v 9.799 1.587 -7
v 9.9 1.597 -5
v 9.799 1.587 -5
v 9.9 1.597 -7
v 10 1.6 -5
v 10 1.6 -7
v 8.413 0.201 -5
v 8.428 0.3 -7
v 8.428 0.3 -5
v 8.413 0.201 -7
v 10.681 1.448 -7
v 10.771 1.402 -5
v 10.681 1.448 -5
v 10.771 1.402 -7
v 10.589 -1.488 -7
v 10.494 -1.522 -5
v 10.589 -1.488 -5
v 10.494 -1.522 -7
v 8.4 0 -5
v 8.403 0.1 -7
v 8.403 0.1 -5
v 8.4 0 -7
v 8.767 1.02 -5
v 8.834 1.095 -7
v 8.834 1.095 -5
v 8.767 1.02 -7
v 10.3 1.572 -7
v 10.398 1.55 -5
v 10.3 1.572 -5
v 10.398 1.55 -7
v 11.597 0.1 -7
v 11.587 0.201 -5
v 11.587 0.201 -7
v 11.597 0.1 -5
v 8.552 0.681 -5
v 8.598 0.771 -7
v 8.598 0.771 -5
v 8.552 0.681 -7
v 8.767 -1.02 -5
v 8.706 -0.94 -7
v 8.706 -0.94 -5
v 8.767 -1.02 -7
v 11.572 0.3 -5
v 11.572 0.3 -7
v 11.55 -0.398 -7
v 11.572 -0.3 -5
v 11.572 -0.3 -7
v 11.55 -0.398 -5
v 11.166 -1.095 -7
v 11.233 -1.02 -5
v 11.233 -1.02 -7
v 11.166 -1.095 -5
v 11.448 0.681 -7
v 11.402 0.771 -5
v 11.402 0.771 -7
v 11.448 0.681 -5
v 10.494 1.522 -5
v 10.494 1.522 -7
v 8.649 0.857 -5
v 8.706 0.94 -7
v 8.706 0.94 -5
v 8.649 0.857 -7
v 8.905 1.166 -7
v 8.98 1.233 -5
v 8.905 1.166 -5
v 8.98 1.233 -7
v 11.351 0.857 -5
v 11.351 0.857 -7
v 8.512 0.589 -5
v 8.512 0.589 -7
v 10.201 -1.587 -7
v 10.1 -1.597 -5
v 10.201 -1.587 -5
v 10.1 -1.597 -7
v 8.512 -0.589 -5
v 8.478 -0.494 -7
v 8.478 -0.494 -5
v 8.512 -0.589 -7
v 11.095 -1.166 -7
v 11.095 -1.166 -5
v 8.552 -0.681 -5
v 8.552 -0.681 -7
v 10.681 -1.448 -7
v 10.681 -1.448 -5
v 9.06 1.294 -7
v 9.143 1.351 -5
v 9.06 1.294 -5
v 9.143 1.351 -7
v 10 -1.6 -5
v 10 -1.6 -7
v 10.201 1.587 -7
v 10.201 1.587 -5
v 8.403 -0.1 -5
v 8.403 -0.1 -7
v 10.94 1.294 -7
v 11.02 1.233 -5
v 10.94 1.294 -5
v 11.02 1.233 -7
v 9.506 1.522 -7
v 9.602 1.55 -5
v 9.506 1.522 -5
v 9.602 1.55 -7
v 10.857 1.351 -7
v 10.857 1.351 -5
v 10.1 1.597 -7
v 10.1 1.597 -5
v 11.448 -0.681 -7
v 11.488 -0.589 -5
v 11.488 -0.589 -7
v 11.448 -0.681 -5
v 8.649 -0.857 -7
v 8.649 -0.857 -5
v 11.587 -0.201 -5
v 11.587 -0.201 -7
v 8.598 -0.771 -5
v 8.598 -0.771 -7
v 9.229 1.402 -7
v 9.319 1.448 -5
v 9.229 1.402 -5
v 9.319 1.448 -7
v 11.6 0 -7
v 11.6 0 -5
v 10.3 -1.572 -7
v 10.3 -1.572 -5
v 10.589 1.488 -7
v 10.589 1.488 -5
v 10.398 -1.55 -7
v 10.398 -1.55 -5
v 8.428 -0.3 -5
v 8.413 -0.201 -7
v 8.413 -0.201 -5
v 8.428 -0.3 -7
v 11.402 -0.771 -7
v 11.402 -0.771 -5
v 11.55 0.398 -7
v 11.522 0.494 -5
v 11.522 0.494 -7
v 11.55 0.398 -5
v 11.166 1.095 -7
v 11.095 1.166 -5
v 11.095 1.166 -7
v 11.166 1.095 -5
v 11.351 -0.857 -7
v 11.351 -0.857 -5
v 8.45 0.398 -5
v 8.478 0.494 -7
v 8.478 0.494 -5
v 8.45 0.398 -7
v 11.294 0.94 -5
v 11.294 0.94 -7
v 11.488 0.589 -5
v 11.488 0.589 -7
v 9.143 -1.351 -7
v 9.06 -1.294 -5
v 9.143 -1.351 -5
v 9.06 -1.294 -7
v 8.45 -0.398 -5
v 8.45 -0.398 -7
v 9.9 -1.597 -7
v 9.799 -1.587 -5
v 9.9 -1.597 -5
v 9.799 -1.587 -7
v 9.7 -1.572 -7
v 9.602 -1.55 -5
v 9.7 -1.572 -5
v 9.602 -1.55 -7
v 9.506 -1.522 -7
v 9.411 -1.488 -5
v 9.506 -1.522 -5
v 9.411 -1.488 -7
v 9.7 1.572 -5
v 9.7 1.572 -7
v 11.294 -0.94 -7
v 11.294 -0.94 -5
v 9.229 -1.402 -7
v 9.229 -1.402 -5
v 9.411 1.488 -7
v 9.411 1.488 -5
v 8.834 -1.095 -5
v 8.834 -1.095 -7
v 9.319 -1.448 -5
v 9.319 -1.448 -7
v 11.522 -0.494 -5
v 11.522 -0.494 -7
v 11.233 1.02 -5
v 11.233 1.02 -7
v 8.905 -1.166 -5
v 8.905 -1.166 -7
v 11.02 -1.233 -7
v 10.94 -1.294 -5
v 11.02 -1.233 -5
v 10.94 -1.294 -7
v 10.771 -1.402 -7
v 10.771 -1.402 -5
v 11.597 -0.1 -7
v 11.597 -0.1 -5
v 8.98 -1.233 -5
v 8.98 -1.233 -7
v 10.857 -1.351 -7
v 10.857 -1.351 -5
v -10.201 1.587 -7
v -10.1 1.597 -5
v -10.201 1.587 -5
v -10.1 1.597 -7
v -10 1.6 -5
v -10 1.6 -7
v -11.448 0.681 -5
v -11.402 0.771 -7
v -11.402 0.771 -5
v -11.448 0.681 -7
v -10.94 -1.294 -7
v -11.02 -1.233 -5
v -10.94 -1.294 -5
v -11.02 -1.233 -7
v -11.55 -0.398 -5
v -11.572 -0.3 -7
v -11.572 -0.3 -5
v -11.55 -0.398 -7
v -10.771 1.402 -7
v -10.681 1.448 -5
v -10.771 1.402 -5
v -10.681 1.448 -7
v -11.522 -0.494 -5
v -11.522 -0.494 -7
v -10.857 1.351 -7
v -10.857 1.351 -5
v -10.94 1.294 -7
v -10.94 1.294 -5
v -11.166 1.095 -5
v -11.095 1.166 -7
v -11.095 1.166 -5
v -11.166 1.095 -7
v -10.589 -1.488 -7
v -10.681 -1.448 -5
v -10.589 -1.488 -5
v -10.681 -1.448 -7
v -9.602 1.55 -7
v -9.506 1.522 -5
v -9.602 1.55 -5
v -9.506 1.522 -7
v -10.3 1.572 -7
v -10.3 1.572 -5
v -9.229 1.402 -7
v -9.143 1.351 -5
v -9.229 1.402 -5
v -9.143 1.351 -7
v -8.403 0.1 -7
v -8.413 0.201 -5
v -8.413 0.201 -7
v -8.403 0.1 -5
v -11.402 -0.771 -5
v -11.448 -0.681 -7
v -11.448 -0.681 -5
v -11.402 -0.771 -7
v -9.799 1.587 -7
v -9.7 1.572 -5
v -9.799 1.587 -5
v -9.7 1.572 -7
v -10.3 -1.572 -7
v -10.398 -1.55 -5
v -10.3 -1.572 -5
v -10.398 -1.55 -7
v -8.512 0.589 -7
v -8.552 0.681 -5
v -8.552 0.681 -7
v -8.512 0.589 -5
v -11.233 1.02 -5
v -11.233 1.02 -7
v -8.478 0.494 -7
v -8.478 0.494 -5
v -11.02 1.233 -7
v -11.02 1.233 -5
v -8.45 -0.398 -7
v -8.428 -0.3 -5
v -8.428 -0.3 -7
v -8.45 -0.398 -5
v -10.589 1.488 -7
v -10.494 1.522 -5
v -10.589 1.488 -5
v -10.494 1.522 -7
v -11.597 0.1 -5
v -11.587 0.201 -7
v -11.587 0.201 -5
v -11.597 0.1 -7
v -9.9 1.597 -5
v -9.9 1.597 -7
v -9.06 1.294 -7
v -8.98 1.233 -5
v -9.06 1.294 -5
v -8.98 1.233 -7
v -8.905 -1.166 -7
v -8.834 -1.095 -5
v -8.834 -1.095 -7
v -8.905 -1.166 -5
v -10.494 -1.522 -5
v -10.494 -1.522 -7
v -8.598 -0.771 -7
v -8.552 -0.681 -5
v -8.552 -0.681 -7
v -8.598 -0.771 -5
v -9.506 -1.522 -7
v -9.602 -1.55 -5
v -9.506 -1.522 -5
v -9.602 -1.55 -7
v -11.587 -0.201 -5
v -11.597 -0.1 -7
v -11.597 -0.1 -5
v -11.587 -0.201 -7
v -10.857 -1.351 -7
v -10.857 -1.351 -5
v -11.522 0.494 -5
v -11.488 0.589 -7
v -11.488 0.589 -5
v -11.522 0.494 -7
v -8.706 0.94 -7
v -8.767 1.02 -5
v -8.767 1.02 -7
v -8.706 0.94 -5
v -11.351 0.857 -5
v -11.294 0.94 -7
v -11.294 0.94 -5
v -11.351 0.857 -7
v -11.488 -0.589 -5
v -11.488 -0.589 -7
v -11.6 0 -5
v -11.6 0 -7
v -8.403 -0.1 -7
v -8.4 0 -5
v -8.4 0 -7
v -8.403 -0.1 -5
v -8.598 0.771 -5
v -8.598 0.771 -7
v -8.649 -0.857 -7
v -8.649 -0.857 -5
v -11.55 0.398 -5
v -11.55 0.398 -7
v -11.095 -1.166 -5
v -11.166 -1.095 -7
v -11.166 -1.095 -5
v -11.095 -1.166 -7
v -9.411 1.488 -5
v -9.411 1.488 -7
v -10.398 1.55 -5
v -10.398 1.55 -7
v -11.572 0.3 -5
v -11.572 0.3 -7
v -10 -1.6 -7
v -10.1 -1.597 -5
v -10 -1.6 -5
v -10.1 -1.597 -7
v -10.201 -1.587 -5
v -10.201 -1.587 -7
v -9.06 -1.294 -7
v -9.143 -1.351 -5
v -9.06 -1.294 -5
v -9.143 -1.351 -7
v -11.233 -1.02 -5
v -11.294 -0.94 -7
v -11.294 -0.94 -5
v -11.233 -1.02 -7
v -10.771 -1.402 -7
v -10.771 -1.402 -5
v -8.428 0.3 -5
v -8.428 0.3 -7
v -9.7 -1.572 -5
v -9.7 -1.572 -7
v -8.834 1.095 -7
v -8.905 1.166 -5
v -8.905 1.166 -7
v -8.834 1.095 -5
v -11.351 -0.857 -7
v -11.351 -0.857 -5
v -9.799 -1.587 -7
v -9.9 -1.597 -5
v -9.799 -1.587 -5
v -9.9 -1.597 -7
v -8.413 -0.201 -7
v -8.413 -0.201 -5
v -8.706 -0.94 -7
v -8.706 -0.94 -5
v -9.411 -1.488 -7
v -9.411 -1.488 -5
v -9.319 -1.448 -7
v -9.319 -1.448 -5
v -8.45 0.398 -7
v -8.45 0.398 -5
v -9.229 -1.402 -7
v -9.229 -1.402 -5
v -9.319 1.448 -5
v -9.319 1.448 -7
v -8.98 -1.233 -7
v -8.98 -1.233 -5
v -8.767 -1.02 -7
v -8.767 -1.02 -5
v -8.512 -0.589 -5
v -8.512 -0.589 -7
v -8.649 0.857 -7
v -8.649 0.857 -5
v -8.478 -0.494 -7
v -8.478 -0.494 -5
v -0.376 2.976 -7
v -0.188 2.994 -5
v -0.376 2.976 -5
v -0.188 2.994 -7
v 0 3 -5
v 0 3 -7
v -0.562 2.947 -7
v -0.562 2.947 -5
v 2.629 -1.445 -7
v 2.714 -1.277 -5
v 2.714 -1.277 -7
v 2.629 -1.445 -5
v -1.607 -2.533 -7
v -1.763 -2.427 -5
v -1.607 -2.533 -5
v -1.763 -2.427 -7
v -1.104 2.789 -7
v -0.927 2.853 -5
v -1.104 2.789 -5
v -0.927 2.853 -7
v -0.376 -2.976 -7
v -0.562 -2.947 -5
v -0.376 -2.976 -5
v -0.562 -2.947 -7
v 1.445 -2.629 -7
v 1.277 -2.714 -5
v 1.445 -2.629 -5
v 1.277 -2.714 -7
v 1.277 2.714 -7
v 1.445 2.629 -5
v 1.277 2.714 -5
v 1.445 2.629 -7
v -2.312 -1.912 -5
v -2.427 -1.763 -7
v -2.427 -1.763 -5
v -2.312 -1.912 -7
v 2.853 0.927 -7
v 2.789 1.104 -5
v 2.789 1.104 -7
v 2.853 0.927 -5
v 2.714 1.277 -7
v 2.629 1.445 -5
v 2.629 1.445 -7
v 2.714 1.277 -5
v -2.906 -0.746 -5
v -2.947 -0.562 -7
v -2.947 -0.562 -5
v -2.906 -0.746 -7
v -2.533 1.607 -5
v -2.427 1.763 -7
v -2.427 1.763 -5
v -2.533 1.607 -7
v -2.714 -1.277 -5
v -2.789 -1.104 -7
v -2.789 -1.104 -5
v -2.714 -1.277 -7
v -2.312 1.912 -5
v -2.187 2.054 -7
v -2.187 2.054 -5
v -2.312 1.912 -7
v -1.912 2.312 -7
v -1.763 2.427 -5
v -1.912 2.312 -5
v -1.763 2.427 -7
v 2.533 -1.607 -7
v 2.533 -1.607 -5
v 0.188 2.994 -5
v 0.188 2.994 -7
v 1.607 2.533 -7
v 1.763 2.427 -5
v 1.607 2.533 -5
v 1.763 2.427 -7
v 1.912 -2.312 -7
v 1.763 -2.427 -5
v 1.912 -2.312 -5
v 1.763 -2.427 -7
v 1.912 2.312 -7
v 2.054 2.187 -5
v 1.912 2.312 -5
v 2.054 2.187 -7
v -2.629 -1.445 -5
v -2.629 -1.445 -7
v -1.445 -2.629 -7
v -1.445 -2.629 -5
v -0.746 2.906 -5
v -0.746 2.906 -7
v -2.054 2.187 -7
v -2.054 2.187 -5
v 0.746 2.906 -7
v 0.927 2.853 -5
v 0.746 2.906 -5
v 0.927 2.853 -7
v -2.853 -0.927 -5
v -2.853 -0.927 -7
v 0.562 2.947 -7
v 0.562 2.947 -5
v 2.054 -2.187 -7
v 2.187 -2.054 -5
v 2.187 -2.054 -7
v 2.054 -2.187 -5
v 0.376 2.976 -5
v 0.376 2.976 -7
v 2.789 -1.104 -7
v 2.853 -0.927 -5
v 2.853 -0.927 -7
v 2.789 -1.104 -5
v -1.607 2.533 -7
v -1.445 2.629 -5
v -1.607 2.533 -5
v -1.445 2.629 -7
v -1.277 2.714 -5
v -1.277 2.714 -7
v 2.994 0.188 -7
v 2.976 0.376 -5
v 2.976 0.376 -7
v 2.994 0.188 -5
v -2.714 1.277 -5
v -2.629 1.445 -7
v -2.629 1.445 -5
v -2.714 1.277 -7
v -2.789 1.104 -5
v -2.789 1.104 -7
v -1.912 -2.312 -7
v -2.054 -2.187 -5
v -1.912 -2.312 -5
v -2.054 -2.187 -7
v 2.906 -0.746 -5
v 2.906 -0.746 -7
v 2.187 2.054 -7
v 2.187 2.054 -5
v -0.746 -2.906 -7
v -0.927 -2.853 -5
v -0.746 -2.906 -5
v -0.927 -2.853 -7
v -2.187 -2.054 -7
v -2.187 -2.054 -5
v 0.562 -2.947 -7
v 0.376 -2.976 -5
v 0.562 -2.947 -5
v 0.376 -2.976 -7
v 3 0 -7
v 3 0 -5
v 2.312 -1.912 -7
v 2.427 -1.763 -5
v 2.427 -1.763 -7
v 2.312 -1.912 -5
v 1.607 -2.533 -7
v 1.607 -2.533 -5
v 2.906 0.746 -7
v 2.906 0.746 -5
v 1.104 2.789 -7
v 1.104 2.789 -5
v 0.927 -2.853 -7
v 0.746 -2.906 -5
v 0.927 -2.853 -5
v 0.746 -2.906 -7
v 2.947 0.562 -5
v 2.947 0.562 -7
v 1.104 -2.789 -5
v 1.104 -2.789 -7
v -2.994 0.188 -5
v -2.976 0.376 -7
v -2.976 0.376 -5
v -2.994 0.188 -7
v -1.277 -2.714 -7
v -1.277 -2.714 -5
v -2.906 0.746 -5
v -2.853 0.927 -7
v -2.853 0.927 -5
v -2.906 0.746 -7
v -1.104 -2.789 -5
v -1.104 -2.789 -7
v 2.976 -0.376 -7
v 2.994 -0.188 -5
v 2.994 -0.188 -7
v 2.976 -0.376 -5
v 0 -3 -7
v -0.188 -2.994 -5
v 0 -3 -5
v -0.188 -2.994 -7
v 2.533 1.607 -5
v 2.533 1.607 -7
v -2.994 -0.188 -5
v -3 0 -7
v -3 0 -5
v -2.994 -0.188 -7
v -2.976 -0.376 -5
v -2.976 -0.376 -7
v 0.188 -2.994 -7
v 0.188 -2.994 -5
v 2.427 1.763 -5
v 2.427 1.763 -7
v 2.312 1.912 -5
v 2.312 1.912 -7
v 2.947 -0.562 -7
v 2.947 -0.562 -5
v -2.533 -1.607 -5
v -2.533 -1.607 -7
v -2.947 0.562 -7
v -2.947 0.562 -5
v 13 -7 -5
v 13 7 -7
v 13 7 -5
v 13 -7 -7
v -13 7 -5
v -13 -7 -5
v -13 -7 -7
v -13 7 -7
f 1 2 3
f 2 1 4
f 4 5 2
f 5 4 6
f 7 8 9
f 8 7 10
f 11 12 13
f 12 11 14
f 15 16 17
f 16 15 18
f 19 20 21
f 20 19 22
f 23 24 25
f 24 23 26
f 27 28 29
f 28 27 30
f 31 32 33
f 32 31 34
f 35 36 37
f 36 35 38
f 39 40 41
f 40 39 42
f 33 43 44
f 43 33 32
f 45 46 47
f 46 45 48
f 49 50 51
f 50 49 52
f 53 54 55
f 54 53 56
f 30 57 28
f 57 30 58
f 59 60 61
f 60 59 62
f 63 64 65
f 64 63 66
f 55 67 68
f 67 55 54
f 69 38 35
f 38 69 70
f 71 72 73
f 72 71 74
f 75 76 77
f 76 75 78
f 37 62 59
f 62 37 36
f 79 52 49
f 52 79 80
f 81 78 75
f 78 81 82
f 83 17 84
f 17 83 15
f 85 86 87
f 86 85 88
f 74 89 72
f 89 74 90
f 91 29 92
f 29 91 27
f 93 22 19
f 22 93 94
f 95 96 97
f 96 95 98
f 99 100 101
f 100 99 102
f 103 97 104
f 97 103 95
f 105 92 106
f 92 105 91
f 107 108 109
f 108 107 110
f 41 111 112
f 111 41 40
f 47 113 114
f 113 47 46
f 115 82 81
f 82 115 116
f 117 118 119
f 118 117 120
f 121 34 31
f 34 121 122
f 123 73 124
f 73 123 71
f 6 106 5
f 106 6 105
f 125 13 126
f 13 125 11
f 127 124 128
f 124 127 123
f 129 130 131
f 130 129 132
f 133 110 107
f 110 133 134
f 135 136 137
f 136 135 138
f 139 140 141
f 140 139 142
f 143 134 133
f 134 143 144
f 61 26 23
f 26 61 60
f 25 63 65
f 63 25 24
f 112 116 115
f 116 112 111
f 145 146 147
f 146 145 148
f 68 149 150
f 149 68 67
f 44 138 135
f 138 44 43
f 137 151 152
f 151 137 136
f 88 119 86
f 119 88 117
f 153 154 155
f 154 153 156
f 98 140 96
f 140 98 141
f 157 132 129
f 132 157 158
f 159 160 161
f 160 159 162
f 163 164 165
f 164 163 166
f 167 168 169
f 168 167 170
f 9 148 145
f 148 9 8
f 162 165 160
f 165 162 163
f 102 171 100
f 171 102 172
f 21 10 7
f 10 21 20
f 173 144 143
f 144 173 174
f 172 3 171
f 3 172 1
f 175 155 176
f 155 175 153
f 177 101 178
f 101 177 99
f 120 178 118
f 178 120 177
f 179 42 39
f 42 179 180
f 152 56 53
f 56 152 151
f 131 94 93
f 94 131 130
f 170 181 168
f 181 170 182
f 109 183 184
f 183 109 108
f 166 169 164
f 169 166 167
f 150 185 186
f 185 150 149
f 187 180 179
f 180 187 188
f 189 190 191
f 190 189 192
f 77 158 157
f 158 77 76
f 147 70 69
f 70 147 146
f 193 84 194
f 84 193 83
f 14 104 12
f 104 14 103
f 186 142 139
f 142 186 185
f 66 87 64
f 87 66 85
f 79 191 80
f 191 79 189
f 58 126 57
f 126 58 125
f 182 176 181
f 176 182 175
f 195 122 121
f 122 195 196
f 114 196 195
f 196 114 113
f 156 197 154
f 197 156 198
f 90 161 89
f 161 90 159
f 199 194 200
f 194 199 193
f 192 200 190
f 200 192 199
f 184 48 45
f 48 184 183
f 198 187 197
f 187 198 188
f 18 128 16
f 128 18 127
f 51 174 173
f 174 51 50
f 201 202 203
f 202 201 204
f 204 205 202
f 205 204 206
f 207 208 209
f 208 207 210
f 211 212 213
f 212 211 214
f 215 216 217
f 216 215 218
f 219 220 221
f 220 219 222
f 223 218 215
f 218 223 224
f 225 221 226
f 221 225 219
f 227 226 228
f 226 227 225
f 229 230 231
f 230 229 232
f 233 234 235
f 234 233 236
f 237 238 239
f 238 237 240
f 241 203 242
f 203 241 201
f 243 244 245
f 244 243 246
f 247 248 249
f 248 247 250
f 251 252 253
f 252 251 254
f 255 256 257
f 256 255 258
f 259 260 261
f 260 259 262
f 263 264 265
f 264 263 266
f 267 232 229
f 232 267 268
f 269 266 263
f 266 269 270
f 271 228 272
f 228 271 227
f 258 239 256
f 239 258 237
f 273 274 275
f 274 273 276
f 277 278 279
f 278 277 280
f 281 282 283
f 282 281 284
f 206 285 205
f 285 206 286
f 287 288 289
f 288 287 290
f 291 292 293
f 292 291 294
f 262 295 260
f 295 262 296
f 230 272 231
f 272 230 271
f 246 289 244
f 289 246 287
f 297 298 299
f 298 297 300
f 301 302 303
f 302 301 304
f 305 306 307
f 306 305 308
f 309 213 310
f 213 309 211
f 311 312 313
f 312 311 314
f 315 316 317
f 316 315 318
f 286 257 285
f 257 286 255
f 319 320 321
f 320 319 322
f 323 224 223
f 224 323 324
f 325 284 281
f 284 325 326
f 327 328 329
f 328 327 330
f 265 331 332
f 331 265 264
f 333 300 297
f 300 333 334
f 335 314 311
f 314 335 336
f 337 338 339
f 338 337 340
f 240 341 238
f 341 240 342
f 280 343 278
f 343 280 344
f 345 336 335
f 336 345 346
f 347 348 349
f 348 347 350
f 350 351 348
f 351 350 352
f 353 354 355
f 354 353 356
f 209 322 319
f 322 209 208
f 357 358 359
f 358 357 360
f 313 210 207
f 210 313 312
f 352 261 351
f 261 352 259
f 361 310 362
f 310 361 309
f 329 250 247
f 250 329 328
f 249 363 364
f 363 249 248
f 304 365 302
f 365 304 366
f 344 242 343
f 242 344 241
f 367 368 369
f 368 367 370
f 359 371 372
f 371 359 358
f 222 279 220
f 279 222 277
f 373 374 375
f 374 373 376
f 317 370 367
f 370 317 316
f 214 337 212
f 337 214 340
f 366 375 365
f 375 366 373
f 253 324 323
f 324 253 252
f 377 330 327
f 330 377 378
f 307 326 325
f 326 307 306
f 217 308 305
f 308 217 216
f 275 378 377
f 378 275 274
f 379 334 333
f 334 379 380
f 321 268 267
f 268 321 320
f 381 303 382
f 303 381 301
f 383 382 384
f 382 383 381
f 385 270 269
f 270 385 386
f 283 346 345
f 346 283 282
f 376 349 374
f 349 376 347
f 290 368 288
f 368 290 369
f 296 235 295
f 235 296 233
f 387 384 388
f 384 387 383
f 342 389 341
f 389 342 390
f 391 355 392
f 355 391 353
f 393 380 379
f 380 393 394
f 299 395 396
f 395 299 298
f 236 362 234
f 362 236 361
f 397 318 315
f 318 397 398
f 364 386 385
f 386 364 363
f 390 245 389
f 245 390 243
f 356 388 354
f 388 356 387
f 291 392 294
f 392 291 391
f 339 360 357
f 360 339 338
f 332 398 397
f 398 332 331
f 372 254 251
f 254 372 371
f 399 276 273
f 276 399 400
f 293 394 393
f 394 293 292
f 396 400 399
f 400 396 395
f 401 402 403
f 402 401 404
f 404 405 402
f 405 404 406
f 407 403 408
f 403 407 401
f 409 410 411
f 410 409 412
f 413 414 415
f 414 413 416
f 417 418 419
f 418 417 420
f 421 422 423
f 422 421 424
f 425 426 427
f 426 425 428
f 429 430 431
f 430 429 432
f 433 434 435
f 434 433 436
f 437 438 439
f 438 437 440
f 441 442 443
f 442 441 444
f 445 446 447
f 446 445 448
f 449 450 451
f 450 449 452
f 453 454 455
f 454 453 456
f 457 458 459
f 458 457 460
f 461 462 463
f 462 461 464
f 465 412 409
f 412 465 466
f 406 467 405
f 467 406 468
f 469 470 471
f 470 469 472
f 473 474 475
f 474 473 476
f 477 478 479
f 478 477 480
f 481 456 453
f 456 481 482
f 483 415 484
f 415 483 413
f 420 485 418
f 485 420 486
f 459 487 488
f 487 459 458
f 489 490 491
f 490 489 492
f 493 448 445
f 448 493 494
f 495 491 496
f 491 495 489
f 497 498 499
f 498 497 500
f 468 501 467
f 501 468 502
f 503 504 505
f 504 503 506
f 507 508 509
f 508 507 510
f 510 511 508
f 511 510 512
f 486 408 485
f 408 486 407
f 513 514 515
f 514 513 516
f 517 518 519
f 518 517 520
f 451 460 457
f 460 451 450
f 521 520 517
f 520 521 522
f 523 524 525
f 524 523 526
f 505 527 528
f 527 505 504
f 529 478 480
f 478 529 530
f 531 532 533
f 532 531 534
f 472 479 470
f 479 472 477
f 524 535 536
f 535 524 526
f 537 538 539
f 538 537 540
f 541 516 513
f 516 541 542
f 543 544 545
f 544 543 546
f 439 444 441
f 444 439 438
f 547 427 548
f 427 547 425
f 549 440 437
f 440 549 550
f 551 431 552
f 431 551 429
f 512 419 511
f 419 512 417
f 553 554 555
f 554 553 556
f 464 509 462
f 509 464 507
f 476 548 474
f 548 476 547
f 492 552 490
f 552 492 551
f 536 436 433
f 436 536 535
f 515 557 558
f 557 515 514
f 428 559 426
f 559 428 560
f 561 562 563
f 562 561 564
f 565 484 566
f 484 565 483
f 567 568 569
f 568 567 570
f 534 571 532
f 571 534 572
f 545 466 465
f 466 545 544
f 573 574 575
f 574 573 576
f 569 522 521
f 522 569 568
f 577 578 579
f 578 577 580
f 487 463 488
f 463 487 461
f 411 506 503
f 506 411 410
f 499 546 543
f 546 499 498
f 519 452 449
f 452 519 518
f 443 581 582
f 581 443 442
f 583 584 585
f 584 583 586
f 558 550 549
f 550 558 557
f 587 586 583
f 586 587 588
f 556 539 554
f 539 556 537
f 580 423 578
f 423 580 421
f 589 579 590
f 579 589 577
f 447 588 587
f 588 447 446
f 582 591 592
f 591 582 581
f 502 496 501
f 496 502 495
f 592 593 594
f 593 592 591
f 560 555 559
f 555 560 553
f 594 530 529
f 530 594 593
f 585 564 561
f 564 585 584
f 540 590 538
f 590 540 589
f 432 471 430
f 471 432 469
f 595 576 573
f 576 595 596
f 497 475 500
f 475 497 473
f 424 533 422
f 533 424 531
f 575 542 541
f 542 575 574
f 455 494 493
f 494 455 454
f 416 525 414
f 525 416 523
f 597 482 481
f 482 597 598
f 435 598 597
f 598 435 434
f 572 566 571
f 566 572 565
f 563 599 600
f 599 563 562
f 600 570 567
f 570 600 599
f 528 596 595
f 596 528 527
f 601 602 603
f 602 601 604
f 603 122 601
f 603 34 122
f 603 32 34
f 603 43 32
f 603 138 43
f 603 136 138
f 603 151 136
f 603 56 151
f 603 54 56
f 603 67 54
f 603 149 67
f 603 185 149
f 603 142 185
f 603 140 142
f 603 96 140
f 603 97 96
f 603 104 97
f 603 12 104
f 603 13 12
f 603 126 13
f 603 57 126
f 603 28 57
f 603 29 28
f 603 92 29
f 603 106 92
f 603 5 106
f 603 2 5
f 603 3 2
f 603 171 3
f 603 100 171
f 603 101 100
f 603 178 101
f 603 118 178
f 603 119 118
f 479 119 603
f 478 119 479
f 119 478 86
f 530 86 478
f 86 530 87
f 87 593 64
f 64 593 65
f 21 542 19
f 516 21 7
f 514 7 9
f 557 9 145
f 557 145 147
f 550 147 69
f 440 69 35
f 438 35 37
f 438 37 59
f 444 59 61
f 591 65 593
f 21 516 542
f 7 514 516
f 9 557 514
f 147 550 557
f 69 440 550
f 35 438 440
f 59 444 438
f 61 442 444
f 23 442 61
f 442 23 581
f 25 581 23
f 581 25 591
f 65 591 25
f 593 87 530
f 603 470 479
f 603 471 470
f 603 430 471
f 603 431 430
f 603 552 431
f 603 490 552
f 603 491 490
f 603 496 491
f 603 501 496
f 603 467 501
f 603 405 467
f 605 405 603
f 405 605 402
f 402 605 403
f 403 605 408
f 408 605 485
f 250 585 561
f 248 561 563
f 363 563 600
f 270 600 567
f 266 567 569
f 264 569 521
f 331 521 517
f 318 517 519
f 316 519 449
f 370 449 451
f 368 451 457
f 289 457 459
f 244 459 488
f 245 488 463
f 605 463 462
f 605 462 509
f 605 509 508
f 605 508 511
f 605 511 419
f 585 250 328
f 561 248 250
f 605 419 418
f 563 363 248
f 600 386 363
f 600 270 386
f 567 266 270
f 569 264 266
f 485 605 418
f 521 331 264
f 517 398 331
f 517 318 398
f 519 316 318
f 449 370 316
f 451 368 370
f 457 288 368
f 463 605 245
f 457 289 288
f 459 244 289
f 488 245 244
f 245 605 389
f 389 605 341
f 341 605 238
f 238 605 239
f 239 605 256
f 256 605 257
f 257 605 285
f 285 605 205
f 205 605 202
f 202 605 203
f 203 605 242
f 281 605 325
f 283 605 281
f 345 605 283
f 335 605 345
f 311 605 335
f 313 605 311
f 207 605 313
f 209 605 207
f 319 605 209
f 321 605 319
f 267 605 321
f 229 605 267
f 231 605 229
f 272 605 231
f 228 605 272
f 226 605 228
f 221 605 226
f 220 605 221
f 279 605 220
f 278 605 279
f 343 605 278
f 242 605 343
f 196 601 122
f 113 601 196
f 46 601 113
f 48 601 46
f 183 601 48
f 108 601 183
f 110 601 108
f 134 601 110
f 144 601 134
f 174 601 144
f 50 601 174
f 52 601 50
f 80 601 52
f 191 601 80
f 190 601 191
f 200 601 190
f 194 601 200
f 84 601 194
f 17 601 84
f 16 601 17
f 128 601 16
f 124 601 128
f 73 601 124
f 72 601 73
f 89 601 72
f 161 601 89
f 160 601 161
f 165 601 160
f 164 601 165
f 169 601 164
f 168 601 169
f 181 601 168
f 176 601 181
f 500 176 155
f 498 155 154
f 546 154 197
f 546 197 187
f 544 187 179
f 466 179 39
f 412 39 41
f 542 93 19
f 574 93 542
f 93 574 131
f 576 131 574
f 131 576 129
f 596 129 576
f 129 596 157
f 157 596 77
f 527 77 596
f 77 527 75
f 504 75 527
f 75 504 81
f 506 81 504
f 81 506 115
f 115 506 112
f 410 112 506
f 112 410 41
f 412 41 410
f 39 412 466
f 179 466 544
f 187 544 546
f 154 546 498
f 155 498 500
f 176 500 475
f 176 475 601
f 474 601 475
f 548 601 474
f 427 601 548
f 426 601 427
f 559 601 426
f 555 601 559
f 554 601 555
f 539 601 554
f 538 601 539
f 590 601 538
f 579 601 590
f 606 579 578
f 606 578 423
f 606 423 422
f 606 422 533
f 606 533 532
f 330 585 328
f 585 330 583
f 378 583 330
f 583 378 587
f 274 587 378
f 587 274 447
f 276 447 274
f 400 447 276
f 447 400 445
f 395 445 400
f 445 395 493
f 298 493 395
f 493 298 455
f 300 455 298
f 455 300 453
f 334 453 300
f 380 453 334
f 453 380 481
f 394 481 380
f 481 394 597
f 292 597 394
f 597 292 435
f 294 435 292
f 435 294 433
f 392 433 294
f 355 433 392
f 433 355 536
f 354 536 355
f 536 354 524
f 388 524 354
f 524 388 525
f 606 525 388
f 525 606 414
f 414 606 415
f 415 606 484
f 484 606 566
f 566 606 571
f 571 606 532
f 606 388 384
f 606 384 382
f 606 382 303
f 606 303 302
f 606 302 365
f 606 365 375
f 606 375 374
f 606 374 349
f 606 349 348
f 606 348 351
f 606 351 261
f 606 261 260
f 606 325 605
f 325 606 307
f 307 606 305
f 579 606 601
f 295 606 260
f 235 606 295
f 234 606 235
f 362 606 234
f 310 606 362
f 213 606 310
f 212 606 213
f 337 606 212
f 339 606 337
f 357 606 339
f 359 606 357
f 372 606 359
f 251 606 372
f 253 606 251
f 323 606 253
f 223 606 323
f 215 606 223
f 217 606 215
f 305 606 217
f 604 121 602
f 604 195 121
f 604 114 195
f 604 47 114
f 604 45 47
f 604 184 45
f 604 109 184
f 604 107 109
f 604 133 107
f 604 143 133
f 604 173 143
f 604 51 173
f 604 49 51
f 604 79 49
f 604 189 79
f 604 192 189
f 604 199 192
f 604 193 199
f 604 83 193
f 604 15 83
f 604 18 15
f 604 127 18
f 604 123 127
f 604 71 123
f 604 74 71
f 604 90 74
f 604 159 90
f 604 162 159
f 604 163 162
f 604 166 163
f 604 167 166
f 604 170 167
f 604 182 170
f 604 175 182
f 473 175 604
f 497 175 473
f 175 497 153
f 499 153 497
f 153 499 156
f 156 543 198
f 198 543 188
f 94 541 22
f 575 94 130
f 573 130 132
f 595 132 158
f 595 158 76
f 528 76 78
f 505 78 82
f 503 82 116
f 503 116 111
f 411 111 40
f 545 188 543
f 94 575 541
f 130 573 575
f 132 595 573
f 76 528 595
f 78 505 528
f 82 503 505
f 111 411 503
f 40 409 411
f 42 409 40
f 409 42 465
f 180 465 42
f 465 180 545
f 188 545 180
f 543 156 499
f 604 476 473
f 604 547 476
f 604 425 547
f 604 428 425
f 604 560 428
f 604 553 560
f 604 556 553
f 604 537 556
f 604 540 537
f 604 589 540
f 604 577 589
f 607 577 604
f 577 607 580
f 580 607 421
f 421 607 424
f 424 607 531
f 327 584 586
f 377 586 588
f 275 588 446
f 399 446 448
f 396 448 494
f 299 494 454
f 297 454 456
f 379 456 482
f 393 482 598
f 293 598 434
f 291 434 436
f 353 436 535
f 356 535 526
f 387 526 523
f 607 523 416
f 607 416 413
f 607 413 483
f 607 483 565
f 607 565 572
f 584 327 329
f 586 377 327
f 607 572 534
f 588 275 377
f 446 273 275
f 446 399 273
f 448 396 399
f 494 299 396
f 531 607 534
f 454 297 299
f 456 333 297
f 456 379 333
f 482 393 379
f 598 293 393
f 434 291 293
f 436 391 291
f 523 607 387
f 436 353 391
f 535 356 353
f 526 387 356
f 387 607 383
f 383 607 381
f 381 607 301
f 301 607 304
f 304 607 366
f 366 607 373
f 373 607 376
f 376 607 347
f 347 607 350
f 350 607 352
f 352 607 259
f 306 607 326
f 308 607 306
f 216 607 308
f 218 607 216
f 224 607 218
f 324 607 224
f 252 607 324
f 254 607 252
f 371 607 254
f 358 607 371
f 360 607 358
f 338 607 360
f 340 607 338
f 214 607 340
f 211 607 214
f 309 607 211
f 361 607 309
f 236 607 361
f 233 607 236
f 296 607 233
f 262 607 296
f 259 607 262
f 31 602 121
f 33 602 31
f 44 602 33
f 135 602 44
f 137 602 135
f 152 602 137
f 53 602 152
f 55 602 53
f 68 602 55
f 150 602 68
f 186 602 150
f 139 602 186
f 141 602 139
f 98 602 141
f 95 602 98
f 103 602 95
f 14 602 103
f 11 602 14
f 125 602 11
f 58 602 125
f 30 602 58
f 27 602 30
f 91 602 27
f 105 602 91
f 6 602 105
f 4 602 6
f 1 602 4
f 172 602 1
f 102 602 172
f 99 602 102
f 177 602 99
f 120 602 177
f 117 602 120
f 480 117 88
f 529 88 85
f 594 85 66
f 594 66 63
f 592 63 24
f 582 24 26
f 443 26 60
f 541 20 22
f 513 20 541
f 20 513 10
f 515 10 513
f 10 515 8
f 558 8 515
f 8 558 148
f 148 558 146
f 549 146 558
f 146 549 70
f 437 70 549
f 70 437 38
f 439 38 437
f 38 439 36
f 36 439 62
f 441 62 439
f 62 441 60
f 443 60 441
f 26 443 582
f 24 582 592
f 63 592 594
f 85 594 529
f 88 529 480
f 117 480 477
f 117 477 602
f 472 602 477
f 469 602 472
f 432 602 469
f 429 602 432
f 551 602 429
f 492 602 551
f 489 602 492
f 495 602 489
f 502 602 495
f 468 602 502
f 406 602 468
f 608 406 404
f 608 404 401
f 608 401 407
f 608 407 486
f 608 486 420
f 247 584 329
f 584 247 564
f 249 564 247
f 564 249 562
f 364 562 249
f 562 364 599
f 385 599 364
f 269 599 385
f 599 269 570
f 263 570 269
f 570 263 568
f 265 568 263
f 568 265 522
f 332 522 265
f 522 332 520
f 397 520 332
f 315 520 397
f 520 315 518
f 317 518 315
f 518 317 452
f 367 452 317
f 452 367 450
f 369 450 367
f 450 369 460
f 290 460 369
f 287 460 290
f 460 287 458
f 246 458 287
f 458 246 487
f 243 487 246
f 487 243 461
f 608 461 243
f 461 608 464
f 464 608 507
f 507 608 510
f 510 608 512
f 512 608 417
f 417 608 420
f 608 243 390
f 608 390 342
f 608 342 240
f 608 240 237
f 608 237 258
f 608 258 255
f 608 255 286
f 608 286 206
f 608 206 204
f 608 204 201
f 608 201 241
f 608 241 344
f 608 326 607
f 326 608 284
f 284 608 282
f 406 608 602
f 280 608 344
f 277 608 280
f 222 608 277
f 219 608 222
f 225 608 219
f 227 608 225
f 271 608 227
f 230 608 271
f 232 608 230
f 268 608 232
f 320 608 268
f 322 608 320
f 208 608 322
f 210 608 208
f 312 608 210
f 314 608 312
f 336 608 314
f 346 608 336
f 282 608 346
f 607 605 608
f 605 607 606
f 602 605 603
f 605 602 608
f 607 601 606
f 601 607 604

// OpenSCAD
translate([0,-7,-7]){


        difference(){
            union(){

                translate([-13,0,0]){
                    cube([26,14,2], center=false);
                }      

            }
            union() {

                translate([10,7,-1]){
                    rotate([0,0,90]){
                        cylinder(h=33, r=1.6, $fn=100, center=false);
                    }
                }  
                translate([-10,7,-1]){
                    rotate([0,0,90]){
                        cylinder(h=33, r=1.6, $fn=100, center=false);
                    }
                }  
                translate([0,7,-1]){
                    rotate([0,0,90]){
                        cylinder(h=33, r=3, $fn=100, center=false);
                    }
                }  


            }
        }
}
